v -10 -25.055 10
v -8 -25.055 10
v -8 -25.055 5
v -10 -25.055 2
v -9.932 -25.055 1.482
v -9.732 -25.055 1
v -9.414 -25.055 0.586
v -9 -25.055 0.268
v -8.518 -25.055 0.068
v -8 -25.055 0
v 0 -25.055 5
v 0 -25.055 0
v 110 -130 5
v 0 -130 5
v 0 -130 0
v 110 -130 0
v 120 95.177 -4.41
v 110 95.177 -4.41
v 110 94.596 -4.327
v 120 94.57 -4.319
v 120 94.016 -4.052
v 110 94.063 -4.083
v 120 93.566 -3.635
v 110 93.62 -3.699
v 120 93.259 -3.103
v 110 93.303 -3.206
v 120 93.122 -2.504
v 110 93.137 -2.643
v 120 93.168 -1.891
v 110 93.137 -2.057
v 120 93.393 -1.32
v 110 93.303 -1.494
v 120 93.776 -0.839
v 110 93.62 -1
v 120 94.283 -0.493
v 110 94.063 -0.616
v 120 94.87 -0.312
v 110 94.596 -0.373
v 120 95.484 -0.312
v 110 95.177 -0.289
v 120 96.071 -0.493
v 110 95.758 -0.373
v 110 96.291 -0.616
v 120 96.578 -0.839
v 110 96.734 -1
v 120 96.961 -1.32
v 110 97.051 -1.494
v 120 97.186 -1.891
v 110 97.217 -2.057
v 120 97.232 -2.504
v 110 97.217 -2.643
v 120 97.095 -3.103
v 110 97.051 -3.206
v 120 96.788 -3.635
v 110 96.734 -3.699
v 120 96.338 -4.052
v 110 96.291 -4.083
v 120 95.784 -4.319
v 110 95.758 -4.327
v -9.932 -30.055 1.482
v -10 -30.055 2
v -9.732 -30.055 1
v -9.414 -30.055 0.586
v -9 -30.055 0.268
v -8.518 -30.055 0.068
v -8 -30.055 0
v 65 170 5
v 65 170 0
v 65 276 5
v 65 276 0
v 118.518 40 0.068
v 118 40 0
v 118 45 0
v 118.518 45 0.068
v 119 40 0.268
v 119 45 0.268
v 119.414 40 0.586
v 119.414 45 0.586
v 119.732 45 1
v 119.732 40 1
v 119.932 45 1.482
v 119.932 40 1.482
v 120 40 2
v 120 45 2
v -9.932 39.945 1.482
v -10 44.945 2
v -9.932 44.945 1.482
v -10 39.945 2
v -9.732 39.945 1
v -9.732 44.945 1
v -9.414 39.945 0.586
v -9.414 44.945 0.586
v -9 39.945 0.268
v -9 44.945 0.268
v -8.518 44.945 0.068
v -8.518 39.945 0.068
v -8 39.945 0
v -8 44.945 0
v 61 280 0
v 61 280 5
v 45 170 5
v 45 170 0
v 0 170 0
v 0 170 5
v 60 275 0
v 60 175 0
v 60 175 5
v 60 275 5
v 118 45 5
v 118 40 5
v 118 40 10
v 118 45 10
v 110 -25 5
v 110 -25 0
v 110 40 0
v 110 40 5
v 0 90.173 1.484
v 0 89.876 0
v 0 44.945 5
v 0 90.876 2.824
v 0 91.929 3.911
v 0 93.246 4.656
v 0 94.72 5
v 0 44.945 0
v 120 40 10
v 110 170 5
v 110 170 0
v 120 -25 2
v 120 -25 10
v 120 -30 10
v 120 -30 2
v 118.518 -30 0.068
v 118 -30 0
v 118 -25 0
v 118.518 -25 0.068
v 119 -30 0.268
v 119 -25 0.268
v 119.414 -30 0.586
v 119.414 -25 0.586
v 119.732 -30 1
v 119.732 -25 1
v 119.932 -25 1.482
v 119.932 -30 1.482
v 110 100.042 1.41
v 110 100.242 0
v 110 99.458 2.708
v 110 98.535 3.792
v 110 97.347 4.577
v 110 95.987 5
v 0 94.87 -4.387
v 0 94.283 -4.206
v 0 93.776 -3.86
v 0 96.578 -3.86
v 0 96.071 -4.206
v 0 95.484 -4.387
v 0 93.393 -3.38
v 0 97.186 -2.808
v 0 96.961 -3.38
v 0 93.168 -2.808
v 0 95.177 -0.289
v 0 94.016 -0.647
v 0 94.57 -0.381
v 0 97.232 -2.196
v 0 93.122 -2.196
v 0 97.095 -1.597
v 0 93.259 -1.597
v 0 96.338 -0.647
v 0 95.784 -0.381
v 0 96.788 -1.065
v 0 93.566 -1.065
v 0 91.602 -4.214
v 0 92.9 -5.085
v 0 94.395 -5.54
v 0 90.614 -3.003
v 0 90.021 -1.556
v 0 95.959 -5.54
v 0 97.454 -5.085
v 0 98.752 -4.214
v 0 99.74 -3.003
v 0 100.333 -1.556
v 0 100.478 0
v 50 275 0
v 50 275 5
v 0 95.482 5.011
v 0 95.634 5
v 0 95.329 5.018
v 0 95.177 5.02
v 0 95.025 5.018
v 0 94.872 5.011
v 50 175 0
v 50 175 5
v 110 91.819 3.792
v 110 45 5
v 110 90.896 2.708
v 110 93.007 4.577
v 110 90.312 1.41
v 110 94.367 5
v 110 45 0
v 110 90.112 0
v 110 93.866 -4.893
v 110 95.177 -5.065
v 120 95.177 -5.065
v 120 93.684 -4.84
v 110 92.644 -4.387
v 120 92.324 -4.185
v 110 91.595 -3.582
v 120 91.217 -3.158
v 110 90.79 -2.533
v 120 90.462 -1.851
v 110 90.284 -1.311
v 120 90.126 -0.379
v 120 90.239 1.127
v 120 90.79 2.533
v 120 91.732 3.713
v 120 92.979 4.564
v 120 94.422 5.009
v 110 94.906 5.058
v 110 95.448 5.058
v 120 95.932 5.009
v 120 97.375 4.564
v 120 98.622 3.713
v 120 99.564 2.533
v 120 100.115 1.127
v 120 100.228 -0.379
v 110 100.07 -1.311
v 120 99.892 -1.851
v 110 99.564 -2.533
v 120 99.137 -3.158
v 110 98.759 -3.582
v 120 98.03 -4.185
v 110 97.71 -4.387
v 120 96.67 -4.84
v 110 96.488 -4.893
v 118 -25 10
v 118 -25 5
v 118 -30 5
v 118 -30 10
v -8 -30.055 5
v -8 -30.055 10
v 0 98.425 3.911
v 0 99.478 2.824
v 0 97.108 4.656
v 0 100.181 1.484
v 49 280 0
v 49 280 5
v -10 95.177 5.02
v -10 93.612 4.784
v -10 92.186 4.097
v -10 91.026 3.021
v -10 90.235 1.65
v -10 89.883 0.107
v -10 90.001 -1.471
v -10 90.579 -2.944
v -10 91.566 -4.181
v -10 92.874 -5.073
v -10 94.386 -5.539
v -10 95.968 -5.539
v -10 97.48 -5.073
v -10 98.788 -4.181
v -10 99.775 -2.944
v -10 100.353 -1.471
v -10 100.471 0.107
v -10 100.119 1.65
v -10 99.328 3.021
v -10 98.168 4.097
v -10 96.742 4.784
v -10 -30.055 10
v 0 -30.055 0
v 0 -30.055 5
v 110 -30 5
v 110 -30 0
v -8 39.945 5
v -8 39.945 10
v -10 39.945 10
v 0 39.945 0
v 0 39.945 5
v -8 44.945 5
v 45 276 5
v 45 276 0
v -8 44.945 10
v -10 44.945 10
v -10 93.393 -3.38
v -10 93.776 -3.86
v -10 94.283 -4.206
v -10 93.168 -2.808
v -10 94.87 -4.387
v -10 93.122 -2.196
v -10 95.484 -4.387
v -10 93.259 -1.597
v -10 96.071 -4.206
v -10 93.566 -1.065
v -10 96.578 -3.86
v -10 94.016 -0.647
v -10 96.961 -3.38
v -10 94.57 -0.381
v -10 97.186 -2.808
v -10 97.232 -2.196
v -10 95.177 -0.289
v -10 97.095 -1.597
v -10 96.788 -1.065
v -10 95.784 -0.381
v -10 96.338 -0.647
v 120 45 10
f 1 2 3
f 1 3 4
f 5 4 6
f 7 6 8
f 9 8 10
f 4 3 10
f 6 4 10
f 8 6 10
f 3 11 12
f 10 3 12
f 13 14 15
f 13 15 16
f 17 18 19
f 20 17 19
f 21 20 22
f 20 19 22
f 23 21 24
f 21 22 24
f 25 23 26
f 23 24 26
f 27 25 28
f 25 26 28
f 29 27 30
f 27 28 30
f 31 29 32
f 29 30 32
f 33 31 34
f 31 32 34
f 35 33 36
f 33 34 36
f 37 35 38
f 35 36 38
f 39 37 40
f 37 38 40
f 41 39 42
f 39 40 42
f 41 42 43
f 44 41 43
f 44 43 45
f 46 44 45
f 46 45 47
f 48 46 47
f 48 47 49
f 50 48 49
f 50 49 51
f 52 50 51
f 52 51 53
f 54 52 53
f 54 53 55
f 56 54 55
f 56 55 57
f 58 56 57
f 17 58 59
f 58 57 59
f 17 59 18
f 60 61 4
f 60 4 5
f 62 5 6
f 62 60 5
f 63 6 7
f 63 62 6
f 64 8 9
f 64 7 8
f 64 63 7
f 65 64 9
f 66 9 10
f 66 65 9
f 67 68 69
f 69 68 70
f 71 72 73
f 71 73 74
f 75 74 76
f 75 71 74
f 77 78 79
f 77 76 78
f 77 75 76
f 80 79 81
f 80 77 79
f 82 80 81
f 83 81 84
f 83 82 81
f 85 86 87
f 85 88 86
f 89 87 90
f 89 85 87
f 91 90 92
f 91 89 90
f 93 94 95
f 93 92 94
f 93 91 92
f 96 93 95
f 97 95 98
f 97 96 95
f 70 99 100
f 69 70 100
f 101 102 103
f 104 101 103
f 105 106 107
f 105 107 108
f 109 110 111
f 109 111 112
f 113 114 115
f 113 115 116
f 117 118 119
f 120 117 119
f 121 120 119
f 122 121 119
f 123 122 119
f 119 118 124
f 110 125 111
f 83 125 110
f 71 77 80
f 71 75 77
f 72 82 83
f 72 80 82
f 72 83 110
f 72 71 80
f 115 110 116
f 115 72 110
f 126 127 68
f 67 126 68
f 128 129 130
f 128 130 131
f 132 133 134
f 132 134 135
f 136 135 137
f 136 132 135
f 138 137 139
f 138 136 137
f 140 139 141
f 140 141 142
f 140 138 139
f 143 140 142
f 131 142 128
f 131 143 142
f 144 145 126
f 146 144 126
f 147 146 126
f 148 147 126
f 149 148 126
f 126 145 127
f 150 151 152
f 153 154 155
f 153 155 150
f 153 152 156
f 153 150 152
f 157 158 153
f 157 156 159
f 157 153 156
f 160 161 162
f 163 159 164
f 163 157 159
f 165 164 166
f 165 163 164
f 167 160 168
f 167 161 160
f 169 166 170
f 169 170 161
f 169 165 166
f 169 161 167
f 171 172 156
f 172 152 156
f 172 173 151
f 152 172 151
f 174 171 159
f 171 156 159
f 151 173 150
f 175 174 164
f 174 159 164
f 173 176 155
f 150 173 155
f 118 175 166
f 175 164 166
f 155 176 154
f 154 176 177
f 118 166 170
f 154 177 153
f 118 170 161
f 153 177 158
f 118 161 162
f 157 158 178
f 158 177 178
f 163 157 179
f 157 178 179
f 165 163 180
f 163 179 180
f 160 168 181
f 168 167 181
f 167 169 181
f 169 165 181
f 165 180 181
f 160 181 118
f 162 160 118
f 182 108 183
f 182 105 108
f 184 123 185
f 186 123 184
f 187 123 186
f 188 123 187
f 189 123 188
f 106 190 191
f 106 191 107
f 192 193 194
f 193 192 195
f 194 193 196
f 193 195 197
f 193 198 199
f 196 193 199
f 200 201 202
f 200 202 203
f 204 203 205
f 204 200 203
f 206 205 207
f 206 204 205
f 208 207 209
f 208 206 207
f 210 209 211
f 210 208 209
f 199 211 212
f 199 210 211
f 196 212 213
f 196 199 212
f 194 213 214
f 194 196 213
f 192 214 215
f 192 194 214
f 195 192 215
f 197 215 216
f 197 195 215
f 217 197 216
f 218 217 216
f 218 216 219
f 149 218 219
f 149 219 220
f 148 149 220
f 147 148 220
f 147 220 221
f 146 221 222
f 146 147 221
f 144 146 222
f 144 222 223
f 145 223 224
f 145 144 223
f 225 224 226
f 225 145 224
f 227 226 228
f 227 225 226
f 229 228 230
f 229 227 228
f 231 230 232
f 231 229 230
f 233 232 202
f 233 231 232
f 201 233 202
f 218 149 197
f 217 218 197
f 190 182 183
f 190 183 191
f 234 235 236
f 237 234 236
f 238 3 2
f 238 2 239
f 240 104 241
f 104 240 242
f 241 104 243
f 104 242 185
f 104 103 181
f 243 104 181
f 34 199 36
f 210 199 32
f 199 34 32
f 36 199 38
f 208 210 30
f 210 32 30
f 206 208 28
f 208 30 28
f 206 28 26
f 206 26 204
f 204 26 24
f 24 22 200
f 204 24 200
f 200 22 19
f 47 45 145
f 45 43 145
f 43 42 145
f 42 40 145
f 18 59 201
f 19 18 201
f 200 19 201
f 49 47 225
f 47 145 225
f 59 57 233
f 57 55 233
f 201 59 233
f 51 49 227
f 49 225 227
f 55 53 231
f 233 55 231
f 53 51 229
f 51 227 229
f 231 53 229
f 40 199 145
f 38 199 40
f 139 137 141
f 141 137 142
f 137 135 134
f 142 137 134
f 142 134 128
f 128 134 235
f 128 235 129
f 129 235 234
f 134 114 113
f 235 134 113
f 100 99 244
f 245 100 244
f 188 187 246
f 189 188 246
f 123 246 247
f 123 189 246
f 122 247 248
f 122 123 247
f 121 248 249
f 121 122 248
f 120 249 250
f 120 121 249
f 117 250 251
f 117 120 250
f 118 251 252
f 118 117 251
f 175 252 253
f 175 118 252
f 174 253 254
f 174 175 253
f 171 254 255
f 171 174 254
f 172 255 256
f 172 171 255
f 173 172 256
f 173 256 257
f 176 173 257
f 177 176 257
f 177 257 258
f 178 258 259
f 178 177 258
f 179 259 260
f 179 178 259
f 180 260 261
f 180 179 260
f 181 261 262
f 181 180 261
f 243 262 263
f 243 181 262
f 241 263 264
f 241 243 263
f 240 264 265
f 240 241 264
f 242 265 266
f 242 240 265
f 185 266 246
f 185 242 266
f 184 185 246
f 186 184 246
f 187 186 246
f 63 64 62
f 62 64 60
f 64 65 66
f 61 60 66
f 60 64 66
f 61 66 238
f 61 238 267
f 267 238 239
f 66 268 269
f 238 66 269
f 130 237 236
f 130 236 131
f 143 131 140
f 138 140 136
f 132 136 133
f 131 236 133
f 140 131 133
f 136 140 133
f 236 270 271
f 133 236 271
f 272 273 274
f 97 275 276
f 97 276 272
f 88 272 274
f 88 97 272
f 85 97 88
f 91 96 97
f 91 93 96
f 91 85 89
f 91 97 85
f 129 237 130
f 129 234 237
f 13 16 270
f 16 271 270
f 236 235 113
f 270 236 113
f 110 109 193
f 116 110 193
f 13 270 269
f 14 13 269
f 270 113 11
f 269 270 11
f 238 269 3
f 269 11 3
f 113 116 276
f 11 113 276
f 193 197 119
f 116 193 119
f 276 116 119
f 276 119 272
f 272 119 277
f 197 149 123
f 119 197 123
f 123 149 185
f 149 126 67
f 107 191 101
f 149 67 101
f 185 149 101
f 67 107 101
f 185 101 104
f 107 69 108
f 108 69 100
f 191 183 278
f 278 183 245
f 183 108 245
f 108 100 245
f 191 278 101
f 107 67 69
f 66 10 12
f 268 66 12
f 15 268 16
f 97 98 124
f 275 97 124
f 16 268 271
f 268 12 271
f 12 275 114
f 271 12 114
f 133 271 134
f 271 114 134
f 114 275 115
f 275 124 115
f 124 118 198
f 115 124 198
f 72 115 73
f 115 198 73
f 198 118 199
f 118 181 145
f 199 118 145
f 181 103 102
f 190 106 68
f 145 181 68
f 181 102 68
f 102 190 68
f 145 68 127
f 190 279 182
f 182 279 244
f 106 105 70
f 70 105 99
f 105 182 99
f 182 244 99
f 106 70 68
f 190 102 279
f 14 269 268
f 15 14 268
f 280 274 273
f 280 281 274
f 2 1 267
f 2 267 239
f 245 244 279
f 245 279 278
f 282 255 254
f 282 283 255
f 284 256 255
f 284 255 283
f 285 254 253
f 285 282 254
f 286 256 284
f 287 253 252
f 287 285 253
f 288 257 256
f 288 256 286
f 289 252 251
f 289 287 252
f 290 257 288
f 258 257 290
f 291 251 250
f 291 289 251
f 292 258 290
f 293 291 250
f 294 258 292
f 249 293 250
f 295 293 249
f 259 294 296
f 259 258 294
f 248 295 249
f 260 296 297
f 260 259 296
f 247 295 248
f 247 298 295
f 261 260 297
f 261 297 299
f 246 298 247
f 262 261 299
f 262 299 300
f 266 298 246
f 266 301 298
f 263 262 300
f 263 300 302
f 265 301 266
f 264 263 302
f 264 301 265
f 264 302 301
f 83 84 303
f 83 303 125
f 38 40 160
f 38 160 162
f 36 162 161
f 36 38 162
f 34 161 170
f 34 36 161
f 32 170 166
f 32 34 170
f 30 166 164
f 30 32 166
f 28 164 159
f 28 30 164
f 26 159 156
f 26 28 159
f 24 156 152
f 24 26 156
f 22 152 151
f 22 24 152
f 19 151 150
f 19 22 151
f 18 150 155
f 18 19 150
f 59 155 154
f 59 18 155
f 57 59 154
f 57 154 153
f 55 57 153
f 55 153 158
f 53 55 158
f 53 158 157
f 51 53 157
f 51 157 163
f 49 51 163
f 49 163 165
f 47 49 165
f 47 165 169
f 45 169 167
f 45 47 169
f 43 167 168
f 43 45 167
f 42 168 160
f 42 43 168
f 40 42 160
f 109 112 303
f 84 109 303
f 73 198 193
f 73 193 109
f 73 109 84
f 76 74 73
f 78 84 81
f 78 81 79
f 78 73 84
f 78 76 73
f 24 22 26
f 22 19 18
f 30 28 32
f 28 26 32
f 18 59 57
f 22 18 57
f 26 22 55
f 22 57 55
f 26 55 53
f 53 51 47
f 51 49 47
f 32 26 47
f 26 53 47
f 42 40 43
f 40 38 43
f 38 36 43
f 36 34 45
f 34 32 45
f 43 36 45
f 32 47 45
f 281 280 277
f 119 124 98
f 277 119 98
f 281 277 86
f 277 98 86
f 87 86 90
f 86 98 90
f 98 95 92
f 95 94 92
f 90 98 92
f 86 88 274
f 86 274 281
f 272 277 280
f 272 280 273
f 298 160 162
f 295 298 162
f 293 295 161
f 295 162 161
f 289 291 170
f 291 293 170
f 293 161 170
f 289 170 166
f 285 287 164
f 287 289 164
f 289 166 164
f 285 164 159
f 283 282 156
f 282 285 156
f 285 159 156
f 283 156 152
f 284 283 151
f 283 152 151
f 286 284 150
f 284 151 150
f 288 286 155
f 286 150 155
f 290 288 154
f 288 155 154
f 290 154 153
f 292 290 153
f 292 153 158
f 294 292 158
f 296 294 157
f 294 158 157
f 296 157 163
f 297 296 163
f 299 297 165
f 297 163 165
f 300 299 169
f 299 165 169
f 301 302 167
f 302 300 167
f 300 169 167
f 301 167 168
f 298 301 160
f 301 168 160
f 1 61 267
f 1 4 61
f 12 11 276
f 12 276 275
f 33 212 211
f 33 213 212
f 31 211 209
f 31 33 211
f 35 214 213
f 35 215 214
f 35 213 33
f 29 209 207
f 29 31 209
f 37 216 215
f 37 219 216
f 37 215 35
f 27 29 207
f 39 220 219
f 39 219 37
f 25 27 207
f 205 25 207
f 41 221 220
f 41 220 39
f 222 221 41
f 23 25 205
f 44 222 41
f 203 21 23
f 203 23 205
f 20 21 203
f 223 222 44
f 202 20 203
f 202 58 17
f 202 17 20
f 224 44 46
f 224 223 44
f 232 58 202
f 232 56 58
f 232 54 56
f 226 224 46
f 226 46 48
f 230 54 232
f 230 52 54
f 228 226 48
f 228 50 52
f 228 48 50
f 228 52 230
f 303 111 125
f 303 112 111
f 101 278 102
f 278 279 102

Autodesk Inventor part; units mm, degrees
ref_plane "YZ Plane" through (0, 0, 0) normal (1, 0, 0) x (0, 1, 0)
ref_plane "XZ Plane" through (0, 0, 0) normal (0, 1, 0) x (-1, 0, 0)
ref_plane "XY Plane" through (0, 0, 0) normal (0, 0, 1) x (1, 0, 0)
sketch "Sketch1" plane through (0, 0, 0) normal (0, 0, 1) x (1, 0, 0)
  line L0 (0, 0) -> (110, 0)
  line L1 (110, 0) -> (110, 170)
  line L2 (110, 170) -> (0, 170)
  line L3 (0, 170) -> (0, 0)
  line L4 (45, 170) -> (65, 170)
  line L5 (65, 170) -> (65, 280)
  line L6 (65, 280) -> (45, 280)
  line L7 (45, 280) -> (45, 170)
  line L8 (50, 175) -> (60, 175)
  line L9 (60, 175) -> (60, 275)
  line L10 (60, 275) -> (50, 275)
  line L11 (50, 275) -> (50, 175)
  dimension "d0" = 110
  dimension "d1" = 170
  dimension "d2" = 20
  dimension "d3" = 110
  dimension "d4" = 10
  dimension "d5" = 100
extrude "Extrusion1" add sketch "Sketch1" along normal blind 5
chamfer "Chamfer1" distance 4 angle 45 2 edges at (45, 280, 2.5) (65, 280, 2.5)
sketch "Sketch2" plane through (110, 0, 0) normal (1, 0, 0) x (0, 0, -1)
  line L0 (0, 170) -> (0, 0) projected
  line L1 (0, 45) -> (-5, 45)
  line L2 (-5, 45) -> (-5, 40)
  line L3 (-5, 40) -> (0, 40)
  line L4 (0, 40) -> (0, 45)
  dimension "d11" = 5
  dimension "d12" = 5
sketch "Sketch3" plane through (0, 0, 0) normal (-1, 0, 0) x (0, 0, 1)
  line L0 (5, 0) -> (5, 170) projected
  line L1 (0, 170) -> (0, 0) projected
  line L2 (5, 39.9453) -> (0, 39.9453)
  line L3 (0, 39.9453) -> (0, 44.9453)
  line L4 (0, 44.9453) -> (5, 44.9453)
  line L5 (5, 44.9453) -> (5, 39.9453)
  dimension "d13" = 5
extrude "Extrusion2" add sketch "Sketch3" along normal blind 10
extrude "Extrusion3" add sketch "Sketch2" along normal blind 10
sketch "Sketch4" plane through (0, 0, 5) normal (0, 0, 1) x (1, 0, 0)
  line L0 (0, 44.9453) -> (-10, 44.9453) projected
  line L1 (0, 39.9453) -> (-10, 39.9453) projected
  line L2 (-10, 44.9453) -> (-8, 44.9453)
  line L3 (-8, 44.9453) -> (-8, 39.9453)
  line L4 (-8, 39.9453) -> (-10, 39.9453)
  line L5 (-10, 39.9453) -> (-10, 44.9453)
  line L6 (120, 45) -> (120, 40) projected
  line L7 (120, 45) -> (118, 45)
  line L8 (118, 45) -> (118, 39.9453)
  line L9 (118, 39.9453) -> (120, 39.9453)
  line L10 (120, 39.9453) -> (120, 45)
  point P0 (0, 0)
  dimension "d18" = 2
  dimension "d19" = 2
extrude "Extrusion4" add sketch "Sketch4" along normal blind 5 contours L3 L1 L5 L0
sketch "Sketch5" plane through (0, 0, 5) normal (0, 0, 1) x (1, 0, 0)
  line L0 (120, 45) -> (120, 40) projected
  line L1 (110, 45) -> (120, 45) projected
  line L2 (120, 40) -> (118, 40)
  line L3 (118, 40) -> (118, 45)
  line L4 (118, 45) -> (120, 45)
  line L5 (120, 45) -> (120, 40)
  point P0 (0, 0)
  dimension "d22" = 2
extrude "Extrusion5" add sketch "Sketch5" along normal blind 5
fillet "Fillet1" radius 2 2 edges at (120, 42.5, 0) (-10, 42.4453, 0)
sketch "Sketch6" plane through (0, 0, 0) normal (0, -1, 0) x (1, 0, 0)
  line L0 (110, 0) -> (110, 5) projected
  line L1 (0, 0) -> (110, 0)
  line L2 (110, 0) -> (110, 5)
  line L3 (110, 5) -> (0, 5)
  line L4 (0, 5) -> (0, 0)
extrude "Extrusion6" add sketch "Sketch6" along normal blind 90
sketch "Sketch7" plane through (0, 0, 5) normal (0, 0, 1) x (1, 0, 0)
  line L0 (0, 170) -> (0, 44.9453) projected
  line L1 (0, 94.7501) -> (109.4357, 94.7501)
  point P0 (0, 0)
sketch "Sketch8" plane through (110, 40, 5) normal (1, 0, 0) x (0, 0, -1)
  line L0 (5, 0) -> (5, -130) projected
  line L1 (5, -65) -> (0, -65)
  line L2 (0, -65) -> (0, -70)
  line L3 (0, -70) -> (5, -70)
  line L4 (5, -70) -> (5, -65)
  point P0 (5, -40)
  dimension "d28" = 5
  dimension "d29" = 5
sketch "Sketch9" plane through (0, 39.9453, 0) normal (-1, 0, 0) x (0, 0, 1)
  line L0 (5, 0.0547) -> (5, -129.9453) projected
  line L1 (5, -65) -> (0, -65)
  line L2 (0, -65) -> (0, -70)
  line L3 (0, -70) -> (5, -70)
  line L4 (5, -70) -> (5, -65)
  point P0 (0, -39.9453)
  dimension "d30" = 5
  dimension "d31" = 5
extrude "Extrusion7" add sketch "Sketch9" along normal blind 10
extrude "Extrusion8" add sketch "Sketch8" along normal blind 10
sketch "Sketch10" plane through (0, 0, 5) normal (0, 0, 1) x (1, 0, 0)
  line L0 (0, -25.0547) -> (-10, -25.0547) projected
  line L1 (0, -30.0547) -> (-10, -30.0547) projected
  line L2 (-10, -25.0547) -> (-8, -25.0547)
  line L3 (-8, -25.0547) -> (-8, -30.0547)
  line L4 (-8, -30.0547) -> (-10, -30.0547)
  line L5 (-10, -30.0547) -> (-10, -25.0547)
  line L6 (120, -25) -> (120, -30) projected
  line L7 (120, -25) -> (118, -25)
  line L8 (118, -25) -> (118, -30)
  line L9 (118, -30) -> (120, -30)
  line L10 (120, -30) -> (120, -25)
  point P0 (0, 0)
  dimension "d36" = 2
  dimension "d37" = 2
extrude "Extrusion9" add sketch "Sketch10" along normal blind 5
fillet "Fillet2" radius 2 2 edges at (120, -27.5, 0) (-10, -27.5547, 0)
sketch "Sketch11" plane through (110, 170, 5) normal (1, 0, 0) x (0, 0, -1)
  line L0 (5, -125) -> (5, 0) projected
  circle A0 centre (5, -74.823) radius 5.0652
  circle A1 centre (7.3498, -74.823) radius 2.0605
  point P0 (5, -170)
extrude "Extrusion10" add sketch "Sketch11" along normal blind 10
sketch "Sketch12" plane through (120, 95.177, 0) normal (1, 0, 0) x (0, 0, -1)
  point P0 (0, -95.177)
sketch "Sketch13" plane through (110, 170, 5) normal (-1, 0, 0) x (0, 0, 1)
  circle A0 centre (-7.3498, -74.823) radius 2.0605 projected
  circle A1 centre (-7.3498, -74.823) radius 2.0605
  point P0 (-5, -170)
extrude "Extrusion11" add sketch "Sketch13" along normal blind 110
sketch "Sketch14" plane through (0, 95.177, -2.3498) normal (-1, 0, 0) x (0, 0, 1)
  circle A0 centre (0, 0) radius 2.0605
  circle A1 centre (0, 0) radius 2.0605 projected
  circle A2 centre (2.0605, 0) radius 5.309
  point P0 (2.3498, -95.177)
extrude "Extrusion12" add sketch "Sketch14" along normal blind 10
sketch "Sketch15" plane through (0, 170, 0) normal (-1, 0, 0) x (0, 0, 1)
  line L0 (0, 0) -> (0, -69.5219) projected
  line L1 (5, 0) -> (5, -74.3661) projected
  circle A0 centre (-2.3126, -29.4971) radius 1.6501
  point P0 (0, -170)
sketch "Sketch16" plane through (0, -90, 0) normal (0, -1, 0) x (1, 0, 0)
  line L0 (0, 0) -> (-8, 0) projected
  line L1 (0, 0) -> (110, 0)
  line L2 (110, 0) -> (110, 5)
  line L3 (110, 5) -> (0, 5)
  line L4 (0, 5) -> (0, 0)
extrude "Extrusion13" add sketch "Sketch16" along normal blind 40
properties part number "DSNDOOR 1" material "Titanium"
